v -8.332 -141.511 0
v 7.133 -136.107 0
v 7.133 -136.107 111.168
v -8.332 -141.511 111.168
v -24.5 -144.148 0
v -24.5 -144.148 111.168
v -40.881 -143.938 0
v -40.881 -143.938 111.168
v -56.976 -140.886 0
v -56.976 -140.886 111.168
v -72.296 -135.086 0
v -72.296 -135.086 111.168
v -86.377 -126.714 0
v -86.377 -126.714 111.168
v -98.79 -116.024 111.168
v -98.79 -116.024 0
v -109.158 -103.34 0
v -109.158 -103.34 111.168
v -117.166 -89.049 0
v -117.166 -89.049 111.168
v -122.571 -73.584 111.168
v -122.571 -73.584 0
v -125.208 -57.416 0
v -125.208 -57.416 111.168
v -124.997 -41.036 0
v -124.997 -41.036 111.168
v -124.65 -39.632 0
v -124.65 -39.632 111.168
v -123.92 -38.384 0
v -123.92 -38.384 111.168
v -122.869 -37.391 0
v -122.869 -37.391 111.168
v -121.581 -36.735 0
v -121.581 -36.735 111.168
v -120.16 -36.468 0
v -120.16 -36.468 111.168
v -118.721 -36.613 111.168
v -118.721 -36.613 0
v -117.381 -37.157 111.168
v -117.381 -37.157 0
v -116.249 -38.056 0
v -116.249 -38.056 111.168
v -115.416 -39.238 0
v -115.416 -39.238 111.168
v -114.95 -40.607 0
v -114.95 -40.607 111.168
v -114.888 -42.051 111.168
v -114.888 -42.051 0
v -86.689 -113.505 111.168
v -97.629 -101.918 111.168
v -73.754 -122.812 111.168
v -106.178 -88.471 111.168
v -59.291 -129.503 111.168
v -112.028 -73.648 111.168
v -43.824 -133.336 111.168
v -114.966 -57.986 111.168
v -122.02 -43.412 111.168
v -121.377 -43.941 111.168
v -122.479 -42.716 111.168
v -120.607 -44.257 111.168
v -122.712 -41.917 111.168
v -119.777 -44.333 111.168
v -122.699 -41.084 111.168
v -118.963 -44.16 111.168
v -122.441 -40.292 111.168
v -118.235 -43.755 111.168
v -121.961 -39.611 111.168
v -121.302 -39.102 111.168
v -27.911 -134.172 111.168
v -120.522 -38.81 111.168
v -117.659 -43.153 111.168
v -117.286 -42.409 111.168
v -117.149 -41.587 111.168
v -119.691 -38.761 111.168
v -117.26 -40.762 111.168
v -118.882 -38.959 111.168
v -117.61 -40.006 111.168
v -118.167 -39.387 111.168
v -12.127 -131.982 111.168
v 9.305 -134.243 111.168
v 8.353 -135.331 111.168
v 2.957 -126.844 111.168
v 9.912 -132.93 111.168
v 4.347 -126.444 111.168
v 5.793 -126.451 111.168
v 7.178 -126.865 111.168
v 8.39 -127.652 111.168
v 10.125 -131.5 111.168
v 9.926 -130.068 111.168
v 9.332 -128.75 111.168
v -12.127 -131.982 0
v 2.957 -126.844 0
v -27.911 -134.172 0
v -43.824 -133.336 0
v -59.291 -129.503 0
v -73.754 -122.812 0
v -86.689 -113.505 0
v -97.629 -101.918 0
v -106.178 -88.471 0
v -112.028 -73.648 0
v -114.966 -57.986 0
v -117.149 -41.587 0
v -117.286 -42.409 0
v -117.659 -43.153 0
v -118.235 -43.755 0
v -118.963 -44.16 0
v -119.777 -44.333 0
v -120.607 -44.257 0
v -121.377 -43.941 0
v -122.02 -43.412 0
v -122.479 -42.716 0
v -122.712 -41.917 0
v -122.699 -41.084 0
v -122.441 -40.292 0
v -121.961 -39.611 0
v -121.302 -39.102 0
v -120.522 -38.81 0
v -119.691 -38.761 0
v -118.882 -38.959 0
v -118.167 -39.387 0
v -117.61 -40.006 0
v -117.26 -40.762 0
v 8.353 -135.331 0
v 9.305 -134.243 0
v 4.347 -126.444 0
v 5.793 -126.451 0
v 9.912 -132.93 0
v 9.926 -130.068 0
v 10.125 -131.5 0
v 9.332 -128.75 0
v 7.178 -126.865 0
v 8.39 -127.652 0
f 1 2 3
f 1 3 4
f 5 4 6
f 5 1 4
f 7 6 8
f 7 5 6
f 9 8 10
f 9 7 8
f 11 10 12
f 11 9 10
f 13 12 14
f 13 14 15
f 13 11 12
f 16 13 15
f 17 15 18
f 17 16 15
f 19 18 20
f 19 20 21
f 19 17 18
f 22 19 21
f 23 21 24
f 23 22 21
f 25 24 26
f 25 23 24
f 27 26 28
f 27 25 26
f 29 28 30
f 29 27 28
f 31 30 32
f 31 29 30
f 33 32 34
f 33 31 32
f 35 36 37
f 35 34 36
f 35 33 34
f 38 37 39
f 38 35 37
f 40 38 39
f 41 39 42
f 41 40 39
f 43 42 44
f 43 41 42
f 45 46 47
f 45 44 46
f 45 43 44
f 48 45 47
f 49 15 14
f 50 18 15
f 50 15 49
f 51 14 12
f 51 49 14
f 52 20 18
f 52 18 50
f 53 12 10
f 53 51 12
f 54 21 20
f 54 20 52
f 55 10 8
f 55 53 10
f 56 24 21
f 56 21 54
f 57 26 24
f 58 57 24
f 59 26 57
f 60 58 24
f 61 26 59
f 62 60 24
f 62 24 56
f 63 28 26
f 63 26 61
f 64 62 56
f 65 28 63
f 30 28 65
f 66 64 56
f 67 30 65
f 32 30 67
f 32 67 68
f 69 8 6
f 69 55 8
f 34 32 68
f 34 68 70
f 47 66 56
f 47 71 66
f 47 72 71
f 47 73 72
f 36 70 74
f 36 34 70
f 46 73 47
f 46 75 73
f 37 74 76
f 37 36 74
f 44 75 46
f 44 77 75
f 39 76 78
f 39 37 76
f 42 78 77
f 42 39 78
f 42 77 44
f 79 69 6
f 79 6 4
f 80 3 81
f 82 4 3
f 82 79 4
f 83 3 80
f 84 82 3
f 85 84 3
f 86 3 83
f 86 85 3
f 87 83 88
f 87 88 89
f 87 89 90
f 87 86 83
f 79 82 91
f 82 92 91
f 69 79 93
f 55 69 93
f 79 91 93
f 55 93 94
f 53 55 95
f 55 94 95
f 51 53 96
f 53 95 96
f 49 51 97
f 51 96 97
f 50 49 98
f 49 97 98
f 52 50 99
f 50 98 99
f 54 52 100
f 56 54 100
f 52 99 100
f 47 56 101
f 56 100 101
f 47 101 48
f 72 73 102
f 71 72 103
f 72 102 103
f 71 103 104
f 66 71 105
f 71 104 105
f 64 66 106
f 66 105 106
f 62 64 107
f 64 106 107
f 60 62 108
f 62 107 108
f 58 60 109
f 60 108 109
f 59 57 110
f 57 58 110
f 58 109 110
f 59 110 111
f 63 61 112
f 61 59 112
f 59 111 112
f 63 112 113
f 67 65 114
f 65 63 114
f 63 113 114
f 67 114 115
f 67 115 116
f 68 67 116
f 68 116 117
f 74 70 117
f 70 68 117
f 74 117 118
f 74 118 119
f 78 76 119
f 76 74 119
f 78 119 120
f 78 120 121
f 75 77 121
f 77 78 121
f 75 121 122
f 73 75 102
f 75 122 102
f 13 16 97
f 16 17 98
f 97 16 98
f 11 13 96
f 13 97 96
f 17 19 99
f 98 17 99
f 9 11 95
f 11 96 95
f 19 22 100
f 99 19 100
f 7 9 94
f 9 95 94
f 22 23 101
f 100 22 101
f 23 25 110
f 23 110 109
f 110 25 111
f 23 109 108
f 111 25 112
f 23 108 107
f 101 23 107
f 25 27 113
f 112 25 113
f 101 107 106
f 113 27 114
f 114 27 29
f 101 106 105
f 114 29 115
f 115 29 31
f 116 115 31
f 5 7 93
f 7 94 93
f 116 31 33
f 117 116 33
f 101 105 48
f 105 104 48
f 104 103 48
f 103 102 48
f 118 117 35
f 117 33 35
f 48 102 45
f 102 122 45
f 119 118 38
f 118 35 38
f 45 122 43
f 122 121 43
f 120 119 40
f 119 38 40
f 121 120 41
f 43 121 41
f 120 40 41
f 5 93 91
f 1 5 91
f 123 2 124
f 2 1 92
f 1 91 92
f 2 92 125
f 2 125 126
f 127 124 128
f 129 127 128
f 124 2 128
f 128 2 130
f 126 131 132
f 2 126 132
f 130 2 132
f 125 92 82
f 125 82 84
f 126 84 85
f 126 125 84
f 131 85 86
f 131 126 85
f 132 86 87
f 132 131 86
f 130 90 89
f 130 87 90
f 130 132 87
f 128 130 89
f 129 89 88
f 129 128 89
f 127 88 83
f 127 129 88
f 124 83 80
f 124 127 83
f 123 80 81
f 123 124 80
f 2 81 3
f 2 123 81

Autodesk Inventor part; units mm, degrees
ref_plane "YZ Plane" through (0, 0, 0) normal (1, 0, 0) x (0, 1, 0)
ref_plane "Work Plane1" through (14.1026, -8.3728, 0) normal (0, 0, 1) x (0.9999, -0.0156, 0)
sketch "Sketch1" plane through (14.1026, -8.3728, 0) normal (0, 0, 1) x (0.9999, -0.0156, 0)
  circle A0 centre (-133.5116, -35.2578) radius 2.794 projected
  circle A1 centre (-7.1362, -123.2288) radius 2.286 construction
  circle A2 centre (-67.2141, -131.9038) radius 3.9624 construction
  circle A3 centre (-44.9289, -42.7619) radius 2.286 projected
  arc A4 (-133.5116, -35.2578) -> (-7.1362, -123.2288) centre (-44.9289, -42.7619) ccw construction
  arc A5 (-113.6145, -38.2305) -> (-113.6145, -38.2305) centre (-133.5116, -35.2578) ccw
  arc A6 (-5.1205, -129.2504) -> (-5.1205, -129.2504) centre (-7.1362, -123.2288) ccw
  arc A7 (-133.5116, -35.2578) -> (-7.1362, -123.2288) centre (-44.9289, -42.7619) ccw construction
  arc A8 (-138.5735, -34.829) -> (-4.9766, -127.8269) centre (-44.9289, -42.7619) ccw
  arc A9 (-128.4497, -35.6866) -> (-9.2958, -118.6307) centre (-44.9289, -42.7619) ccw
  arc A10 (-128.4497, -35.6866) -> (-138.5735, -34.829) centre (-133.5116, -35.2578) ccw
  arc A11 (-4.9766, -127.8269) -> (-9.2958, -118.6307) centre (-7.1362, -123.2288) ccw
  point P0 (-14.2313, 8.1521)
  dimension "d0" = 12.7
  dimension "d3" = 10.16
ref_plane "Work Plane2" through (-268.3983, -269.3131, 111.1682) normal (0, 0, -1) x (0, 1, 0)
extrude "Extrusion1" add sketch "Sketch1" along normal up to surface (111.1682 mm away) contours A8 A10 A9 A5 | A5 A9 A6 A8 | A6 A9 A11 A8 picked at (-134.0145, -50.6087) picked at (-9.8396, -124.4417)
properties part number "Mesh"
